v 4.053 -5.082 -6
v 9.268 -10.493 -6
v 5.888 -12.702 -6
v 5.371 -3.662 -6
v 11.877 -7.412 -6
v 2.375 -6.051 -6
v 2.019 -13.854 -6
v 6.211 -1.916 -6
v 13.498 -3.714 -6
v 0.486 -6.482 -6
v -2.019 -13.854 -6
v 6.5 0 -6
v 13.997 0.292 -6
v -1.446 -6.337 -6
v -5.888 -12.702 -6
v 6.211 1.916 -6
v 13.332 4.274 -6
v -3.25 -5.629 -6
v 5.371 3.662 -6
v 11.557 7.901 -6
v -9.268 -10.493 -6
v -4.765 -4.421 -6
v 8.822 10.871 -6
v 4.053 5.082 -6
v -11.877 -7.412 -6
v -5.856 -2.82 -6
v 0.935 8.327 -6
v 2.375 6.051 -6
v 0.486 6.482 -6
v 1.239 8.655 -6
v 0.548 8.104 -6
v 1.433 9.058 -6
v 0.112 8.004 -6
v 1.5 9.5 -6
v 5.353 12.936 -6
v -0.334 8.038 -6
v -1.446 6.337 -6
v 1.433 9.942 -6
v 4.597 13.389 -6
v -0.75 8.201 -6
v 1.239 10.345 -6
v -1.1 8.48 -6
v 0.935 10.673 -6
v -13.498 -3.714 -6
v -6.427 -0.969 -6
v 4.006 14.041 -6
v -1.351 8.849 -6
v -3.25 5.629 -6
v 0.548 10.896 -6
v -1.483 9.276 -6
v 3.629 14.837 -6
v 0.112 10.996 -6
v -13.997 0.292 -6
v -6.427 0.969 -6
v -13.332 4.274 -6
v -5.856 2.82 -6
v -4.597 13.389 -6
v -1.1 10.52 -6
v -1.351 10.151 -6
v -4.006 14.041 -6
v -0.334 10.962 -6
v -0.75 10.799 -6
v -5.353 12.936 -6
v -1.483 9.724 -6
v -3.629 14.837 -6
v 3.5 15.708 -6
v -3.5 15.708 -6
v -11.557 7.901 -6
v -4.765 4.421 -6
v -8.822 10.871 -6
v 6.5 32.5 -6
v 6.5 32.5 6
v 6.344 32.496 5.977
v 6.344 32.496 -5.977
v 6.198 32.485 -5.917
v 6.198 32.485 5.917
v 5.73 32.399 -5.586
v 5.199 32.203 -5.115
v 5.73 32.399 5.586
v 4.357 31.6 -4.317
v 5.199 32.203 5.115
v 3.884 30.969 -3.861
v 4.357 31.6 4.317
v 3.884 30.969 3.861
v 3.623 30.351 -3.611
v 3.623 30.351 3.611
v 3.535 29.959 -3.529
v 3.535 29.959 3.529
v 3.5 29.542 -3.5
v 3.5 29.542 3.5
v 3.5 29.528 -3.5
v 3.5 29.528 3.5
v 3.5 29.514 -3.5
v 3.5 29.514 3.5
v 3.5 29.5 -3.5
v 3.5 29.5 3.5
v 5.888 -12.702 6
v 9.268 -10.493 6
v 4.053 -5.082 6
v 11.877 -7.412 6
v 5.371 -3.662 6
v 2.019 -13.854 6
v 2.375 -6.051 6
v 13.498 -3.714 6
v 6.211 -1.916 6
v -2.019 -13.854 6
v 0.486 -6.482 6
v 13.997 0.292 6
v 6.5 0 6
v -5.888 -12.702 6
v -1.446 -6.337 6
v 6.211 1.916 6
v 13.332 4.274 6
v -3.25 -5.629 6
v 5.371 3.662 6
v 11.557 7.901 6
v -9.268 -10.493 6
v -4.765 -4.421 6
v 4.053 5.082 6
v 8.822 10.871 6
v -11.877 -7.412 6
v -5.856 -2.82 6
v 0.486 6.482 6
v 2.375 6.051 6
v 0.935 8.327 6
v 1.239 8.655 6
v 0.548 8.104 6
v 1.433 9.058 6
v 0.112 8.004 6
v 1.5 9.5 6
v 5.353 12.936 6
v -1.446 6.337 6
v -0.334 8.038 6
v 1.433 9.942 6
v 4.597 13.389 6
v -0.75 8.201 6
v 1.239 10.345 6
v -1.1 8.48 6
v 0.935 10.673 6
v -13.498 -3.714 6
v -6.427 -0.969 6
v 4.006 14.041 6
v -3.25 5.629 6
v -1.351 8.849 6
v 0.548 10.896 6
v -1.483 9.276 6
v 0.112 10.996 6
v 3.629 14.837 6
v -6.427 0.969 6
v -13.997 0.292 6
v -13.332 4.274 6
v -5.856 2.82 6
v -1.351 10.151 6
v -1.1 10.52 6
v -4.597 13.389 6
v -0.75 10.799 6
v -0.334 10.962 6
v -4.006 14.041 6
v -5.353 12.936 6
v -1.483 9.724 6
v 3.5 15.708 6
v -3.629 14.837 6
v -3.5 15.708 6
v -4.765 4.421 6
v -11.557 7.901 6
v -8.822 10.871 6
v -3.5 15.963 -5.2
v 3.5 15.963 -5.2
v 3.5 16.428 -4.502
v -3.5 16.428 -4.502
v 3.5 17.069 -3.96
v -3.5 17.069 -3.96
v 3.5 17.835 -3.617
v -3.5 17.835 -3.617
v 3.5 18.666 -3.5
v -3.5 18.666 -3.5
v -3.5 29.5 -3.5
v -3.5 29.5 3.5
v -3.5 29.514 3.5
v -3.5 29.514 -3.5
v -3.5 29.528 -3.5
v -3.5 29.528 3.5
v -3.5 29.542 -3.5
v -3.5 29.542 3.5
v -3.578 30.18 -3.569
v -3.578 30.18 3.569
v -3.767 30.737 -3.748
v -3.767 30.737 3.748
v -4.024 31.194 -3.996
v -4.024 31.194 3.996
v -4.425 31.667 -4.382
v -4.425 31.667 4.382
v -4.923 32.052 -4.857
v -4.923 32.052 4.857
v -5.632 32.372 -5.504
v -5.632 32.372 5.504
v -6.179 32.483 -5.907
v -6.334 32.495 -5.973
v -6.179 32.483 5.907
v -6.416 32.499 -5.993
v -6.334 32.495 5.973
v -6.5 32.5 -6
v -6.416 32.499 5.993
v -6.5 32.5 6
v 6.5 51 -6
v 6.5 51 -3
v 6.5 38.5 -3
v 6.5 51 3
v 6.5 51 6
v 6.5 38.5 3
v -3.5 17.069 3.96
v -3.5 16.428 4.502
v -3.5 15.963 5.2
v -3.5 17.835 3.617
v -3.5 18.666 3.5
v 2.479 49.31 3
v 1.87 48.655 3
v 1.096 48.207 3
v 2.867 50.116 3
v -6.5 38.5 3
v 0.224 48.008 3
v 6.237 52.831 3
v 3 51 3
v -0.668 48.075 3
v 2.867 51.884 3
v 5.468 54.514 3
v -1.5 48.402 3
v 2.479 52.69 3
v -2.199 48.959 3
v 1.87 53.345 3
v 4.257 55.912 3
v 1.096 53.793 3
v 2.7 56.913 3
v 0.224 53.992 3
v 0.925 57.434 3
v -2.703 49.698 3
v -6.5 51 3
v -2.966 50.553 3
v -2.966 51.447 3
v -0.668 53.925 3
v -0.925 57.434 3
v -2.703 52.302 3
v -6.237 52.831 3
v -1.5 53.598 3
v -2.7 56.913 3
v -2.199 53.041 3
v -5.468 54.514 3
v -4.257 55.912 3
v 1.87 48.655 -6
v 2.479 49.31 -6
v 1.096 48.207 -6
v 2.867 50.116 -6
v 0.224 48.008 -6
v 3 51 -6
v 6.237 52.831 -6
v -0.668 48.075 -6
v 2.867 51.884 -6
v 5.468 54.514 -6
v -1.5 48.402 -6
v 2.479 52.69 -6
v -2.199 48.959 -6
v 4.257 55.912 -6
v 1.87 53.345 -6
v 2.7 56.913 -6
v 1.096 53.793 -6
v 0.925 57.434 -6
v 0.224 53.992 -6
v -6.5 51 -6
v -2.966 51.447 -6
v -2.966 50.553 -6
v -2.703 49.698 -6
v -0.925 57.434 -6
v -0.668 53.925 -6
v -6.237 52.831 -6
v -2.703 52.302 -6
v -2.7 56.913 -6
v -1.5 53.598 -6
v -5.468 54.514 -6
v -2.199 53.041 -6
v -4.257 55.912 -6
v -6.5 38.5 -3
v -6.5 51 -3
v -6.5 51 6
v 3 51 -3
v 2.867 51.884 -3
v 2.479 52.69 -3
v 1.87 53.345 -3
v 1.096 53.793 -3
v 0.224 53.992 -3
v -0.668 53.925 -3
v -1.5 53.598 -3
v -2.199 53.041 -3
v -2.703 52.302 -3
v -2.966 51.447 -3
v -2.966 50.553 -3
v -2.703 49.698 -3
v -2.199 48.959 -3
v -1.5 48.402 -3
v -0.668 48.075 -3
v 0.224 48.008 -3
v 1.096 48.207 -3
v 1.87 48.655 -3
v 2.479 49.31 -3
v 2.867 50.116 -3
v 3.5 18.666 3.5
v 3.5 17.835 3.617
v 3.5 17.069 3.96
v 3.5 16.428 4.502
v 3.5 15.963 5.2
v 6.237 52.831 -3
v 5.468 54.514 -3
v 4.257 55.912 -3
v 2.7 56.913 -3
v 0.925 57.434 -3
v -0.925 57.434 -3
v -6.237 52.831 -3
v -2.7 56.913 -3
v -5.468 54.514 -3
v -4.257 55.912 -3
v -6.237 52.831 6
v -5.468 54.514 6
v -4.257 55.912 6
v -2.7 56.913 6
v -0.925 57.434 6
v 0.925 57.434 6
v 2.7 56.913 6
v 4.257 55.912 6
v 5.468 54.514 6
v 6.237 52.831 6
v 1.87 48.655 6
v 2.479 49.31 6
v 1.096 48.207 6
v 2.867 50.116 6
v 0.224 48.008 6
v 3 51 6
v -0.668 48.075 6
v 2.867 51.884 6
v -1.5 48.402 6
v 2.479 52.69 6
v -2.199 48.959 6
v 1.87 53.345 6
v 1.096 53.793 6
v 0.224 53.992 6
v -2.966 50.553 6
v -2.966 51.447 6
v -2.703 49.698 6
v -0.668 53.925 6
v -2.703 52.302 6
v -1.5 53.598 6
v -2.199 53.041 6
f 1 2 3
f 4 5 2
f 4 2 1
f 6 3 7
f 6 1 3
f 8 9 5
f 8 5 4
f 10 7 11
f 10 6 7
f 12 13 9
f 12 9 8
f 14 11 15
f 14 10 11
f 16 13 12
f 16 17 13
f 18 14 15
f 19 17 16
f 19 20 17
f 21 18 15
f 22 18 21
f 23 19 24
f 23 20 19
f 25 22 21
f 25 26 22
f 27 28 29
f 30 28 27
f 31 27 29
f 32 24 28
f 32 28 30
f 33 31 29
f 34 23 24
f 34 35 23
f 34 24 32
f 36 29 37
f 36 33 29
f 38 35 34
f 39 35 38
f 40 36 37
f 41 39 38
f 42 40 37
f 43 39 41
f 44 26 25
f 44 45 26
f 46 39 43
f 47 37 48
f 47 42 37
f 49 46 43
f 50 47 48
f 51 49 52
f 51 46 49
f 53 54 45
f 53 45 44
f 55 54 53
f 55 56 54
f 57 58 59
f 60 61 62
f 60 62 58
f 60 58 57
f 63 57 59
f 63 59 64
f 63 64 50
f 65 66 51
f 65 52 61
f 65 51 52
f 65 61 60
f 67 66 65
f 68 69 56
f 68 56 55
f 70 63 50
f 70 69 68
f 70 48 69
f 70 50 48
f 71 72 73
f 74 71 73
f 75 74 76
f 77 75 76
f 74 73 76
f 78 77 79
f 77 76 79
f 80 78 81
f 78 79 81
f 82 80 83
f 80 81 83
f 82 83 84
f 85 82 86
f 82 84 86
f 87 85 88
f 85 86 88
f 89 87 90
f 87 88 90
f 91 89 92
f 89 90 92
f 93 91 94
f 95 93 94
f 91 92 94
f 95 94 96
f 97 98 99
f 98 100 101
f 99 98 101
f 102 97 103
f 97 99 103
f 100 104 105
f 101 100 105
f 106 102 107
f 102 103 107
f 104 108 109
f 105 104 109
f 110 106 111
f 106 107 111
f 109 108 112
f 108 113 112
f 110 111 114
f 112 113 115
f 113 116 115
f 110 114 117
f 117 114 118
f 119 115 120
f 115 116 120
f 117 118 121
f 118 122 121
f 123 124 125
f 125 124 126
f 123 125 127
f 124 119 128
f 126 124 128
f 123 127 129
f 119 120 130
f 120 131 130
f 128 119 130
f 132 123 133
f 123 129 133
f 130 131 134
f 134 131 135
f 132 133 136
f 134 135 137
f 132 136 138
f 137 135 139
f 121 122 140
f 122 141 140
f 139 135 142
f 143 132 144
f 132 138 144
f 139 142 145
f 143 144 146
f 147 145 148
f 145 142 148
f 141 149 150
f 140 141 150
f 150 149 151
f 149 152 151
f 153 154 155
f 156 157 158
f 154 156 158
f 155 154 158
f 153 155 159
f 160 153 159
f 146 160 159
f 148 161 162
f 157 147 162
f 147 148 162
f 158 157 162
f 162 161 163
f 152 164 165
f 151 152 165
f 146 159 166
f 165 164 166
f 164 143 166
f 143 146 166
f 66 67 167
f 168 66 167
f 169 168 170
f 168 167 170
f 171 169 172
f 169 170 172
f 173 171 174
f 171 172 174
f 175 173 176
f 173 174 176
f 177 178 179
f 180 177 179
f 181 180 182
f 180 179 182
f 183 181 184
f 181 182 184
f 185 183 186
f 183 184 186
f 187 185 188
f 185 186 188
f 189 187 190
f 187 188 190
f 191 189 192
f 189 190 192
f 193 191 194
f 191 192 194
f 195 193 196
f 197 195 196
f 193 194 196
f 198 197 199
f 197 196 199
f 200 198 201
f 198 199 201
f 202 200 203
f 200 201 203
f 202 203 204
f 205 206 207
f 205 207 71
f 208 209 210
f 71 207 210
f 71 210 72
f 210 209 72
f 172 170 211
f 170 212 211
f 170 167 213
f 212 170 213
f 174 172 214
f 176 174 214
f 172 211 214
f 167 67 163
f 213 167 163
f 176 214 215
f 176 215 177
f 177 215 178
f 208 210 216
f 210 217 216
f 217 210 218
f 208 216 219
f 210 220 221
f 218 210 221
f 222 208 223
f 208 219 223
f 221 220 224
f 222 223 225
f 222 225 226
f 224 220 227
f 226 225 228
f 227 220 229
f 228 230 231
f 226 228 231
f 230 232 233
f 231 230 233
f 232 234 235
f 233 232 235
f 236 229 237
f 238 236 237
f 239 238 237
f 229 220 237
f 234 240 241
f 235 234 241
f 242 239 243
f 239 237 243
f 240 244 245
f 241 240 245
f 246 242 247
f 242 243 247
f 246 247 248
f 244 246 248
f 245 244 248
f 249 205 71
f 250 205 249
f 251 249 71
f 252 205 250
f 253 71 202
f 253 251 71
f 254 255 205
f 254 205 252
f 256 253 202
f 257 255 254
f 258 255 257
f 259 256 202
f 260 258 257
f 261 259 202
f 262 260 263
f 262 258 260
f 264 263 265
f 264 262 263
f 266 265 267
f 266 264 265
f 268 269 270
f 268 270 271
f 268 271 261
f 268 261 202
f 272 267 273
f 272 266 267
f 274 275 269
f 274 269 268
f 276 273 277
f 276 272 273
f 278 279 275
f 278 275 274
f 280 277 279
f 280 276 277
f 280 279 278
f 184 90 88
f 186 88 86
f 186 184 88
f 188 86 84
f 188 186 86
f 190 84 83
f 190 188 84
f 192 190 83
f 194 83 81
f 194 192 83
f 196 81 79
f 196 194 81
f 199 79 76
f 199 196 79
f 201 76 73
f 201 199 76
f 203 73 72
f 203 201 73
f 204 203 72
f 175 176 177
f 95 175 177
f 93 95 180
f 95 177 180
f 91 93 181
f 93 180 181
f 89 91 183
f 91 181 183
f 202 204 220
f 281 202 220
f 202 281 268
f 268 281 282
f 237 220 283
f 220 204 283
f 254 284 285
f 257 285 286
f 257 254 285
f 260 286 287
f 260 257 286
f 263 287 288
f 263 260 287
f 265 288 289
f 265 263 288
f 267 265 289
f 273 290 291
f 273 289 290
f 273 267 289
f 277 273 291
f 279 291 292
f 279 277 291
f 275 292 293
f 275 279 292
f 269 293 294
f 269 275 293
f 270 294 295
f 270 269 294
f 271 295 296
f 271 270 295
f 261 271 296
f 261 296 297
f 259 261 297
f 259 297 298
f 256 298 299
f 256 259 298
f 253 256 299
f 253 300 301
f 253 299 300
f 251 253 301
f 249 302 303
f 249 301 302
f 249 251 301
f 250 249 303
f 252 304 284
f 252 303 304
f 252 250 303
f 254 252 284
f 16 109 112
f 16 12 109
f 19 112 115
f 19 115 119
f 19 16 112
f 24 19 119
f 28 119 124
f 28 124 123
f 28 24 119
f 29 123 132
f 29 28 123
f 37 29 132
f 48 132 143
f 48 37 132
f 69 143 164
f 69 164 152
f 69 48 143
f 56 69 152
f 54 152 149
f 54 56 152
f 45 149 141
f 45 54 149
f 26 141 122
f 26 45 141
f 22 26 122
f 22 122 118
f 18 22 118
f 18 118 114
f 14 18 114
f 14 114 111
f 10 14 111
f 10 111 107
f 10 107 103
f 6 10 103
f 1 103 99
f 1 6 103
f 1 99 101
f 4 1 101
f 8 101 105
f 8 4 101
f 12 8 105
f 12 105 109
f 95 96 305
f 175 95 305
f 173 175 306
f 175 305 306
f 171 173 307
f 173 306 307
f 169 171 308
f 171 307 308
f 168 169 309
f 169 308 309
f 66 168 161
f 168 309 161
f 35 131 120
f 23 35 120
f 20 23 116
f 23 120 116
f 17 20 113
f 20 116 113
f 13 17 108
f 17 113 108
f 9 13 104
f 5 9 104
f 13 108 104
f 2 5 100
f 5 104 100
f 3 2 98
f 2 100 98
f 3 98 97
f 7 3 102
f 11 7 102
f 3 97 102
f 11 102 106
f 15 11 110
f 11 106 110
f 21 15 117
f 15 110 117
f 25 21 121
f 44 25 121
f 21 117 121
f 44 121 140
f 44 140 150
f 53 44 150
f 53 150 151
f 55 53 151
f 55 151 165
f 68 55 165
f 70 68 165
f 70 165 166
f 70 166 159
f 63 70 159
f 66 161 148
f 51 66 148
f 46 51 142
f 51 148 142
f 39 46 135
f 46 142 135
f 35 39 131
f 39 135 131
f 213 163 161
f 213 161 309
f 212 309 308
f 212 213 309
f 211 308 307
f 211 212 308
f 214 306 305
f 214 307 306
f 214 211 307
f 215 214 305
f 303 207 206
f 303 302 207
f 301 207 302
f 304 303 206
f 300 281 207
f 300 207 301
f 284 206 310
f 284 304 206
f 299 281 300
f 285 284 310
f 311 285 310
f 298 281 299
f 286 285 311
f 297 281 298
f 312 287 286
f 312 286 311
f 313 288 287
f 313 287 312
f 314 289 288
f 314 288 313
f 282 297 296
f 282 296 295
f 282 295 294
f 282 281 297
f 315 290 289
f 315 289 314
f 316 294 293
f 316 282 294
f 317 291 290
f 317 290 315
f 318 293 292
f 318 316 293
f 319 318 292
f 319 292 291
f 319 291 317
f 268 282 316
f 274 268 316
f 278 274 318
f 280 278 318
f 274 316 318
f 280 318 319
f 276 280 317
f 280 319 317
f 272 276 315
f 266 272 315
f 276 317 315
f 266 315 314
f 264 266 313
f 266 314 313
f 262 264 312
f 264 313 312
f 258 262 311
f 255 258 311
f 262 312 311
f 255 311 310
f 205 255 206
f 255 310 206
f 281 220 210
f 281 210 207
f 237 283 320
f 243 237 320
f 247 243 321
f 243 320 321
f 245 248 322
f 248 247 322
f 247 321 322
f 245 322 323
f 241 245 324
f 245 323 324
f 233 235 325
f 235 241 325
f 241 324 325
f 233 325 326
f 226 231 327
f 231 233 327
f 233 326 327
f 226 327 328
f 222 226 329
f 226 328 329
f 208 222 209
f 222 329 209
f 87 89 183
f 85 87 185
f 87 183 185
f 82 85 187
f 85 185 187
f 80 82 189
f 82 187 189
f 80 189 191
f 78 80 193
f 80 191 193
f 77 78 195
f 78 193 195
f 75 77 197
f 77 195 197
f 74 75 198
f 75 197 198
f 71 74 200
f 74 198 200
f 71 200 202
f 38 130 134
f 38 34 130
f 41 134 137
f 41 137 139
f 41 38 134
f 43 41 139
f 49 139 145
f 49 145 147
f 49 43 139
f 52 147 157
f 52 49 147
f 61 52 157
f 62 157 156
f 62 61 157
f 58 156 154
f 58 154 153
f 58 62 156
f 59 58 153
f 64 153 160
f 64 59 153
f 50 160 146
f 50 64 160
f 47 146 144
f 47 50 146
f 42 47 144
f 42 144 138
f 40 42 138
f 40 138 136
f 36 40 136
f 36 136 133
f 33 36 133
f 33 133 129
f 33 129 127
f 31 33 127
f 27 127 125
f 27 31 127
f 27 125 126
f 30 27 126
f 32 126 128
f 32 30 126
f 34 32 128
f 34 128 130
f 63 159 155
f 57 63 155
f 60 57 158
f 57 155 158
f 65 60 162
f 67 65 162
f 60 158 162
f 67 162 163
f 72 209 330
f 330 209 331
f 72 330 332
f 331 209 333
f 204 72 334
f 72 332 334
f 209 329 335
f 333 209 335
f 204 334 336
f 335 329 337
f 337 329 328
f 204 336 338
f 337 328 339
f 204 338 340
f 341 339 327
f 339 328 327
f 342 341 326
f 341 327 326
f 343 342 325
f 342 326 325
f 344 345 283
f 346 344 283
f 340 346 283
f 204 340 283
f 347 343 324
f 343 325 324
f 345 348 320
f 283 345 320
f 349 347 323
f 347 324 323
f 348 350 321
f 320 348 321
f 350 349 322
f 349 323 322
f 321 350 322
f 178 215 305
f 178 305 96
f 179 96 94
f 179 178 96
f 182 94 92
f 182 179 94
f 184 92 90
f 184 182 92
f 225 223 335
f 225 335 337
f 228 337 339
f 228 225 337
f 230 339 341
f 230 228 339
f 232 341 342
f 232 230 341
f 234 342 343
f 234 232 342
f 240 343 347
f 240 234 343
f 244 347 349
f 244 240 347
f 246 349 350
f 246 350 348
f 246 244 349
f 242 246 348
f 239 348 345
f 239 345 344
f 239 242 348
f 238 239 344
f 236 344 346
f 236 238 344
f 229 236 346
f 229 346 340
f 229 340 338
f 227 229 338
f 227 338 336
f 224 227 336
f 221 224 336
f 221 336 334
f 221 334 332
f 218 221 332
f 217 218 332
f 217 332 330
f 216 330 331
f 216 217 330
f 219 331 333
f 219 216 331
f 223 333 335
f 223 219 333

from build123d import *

# Parameters (mm, degrees)
SKETCH1_R               = 6.5
SKETCH1_R_2             = 1.5
SKETCH1_R_3             = 3
BOSS_EXTRUDE1_DEPTH     = 6
CUT_EXTRUDE1_DEPTH      = 60.483190903
CUT_EXTRUDE1_DEPTH_BACK = 60.483190903
SKETCH2_W               = 6
SKETCH2_H               = 19


with BuildPart() as part:
    # Sketch1 → Boss-Extrude1 (new, symmetric)
    with BuildSketch(Plane.XY):
        with BuildLine():
            Line((-3.5, 15.708278072), (-3.5, 29.5))
            ThreePointArc((-3.5, 29.5), (-4.378679656, 31.621320344), (-6.5, 32.5))
            Line((-6.5, 32.5), (-6.5, 51))
            ThreePointArc((-6.5, 51), (0, 57.5), (6.5, 51))
            Line((6.5, 51), (6.5, 32.5))
            ThreePointArc((6.5, 32.5), (4.378679656, 31.621320344), (3.5, 29.5))
            Line((3.5, 29.5), (3.5, 15.708278072))
            ThreePointArc((3.5, 15.708278072), (4.00588929, 14.041121282), (5.352941176, 12.936229001))
            ThreePointArc((5.352941176, 12.936229001), (0, -14), (-5.352941176, 12.936229001))
            ThreePointArc((-5.352941176, 12.936229001), (-4.00588929, 14.041121282), (-3.5, 15.708278072))
        make_face()
        Circle(SKETCH1_R, mode=Mode.SUBTRACT)
        with Locations((0, 9.5)):
            Circle(SKETCH1_R_2, mode=Mode.SUBTRACT)
        with Locations((0, 51)):
            Circle(SKETCH1_R_3, mode=Mode.SUBTRACT)
    extrude(amount=BOSS_EXTRUDE1_DEPTH, both=True)

    # Sketch2 → Cut-Extrude1 (cut, two sides: drawn at the far end of the back side and taken through both)
    with BuildSketch(Plane(origin=(0, 0, 0), x_dir=(0, 0, -1), z_dir=(1, 0, 0)).offset(-CUT_EXTRUDE1_DEPTH_BACK)):
        with BuildLine():
            Line((-6, 32.5), (-6, 15.708278072))
            ThreePointArc((-6, 15.708278072), (-4.208712153, 16.729826291), (-3.5, 18.666317964))
            Line((-3.5, 18.666317964), (-3.5, 29.541960108))
            ThreePointArc((-3.5, 29.541960108), (-4.208712153, 31.478451782), (-6, 32.5))
        make_face()
        with BuildLine():
            Line((6, 32.5), (6, 15.708278072))
            ThreePointArc((6, 15.708278072), (4.208712153, 16.729826291), (3.5, 18.666317964))
            Line((3.5, 18.666317964), (3.5, 29.541960108))
            ThreePointArc((3.5, 29.541960108), (4.208712153, 31.478451782), (6, 32.5))
        make_face()
        with Locations((0, 48)):
            Rectangle(SKETCH2_W, SKETCH2_H)
    extrude(amount=CUT_EXTRUDE1_DEPTH + CUT_EXTRUDE1_DEPTH_BACK, mode=Mode.SUBTRACT)


solid = part.part
